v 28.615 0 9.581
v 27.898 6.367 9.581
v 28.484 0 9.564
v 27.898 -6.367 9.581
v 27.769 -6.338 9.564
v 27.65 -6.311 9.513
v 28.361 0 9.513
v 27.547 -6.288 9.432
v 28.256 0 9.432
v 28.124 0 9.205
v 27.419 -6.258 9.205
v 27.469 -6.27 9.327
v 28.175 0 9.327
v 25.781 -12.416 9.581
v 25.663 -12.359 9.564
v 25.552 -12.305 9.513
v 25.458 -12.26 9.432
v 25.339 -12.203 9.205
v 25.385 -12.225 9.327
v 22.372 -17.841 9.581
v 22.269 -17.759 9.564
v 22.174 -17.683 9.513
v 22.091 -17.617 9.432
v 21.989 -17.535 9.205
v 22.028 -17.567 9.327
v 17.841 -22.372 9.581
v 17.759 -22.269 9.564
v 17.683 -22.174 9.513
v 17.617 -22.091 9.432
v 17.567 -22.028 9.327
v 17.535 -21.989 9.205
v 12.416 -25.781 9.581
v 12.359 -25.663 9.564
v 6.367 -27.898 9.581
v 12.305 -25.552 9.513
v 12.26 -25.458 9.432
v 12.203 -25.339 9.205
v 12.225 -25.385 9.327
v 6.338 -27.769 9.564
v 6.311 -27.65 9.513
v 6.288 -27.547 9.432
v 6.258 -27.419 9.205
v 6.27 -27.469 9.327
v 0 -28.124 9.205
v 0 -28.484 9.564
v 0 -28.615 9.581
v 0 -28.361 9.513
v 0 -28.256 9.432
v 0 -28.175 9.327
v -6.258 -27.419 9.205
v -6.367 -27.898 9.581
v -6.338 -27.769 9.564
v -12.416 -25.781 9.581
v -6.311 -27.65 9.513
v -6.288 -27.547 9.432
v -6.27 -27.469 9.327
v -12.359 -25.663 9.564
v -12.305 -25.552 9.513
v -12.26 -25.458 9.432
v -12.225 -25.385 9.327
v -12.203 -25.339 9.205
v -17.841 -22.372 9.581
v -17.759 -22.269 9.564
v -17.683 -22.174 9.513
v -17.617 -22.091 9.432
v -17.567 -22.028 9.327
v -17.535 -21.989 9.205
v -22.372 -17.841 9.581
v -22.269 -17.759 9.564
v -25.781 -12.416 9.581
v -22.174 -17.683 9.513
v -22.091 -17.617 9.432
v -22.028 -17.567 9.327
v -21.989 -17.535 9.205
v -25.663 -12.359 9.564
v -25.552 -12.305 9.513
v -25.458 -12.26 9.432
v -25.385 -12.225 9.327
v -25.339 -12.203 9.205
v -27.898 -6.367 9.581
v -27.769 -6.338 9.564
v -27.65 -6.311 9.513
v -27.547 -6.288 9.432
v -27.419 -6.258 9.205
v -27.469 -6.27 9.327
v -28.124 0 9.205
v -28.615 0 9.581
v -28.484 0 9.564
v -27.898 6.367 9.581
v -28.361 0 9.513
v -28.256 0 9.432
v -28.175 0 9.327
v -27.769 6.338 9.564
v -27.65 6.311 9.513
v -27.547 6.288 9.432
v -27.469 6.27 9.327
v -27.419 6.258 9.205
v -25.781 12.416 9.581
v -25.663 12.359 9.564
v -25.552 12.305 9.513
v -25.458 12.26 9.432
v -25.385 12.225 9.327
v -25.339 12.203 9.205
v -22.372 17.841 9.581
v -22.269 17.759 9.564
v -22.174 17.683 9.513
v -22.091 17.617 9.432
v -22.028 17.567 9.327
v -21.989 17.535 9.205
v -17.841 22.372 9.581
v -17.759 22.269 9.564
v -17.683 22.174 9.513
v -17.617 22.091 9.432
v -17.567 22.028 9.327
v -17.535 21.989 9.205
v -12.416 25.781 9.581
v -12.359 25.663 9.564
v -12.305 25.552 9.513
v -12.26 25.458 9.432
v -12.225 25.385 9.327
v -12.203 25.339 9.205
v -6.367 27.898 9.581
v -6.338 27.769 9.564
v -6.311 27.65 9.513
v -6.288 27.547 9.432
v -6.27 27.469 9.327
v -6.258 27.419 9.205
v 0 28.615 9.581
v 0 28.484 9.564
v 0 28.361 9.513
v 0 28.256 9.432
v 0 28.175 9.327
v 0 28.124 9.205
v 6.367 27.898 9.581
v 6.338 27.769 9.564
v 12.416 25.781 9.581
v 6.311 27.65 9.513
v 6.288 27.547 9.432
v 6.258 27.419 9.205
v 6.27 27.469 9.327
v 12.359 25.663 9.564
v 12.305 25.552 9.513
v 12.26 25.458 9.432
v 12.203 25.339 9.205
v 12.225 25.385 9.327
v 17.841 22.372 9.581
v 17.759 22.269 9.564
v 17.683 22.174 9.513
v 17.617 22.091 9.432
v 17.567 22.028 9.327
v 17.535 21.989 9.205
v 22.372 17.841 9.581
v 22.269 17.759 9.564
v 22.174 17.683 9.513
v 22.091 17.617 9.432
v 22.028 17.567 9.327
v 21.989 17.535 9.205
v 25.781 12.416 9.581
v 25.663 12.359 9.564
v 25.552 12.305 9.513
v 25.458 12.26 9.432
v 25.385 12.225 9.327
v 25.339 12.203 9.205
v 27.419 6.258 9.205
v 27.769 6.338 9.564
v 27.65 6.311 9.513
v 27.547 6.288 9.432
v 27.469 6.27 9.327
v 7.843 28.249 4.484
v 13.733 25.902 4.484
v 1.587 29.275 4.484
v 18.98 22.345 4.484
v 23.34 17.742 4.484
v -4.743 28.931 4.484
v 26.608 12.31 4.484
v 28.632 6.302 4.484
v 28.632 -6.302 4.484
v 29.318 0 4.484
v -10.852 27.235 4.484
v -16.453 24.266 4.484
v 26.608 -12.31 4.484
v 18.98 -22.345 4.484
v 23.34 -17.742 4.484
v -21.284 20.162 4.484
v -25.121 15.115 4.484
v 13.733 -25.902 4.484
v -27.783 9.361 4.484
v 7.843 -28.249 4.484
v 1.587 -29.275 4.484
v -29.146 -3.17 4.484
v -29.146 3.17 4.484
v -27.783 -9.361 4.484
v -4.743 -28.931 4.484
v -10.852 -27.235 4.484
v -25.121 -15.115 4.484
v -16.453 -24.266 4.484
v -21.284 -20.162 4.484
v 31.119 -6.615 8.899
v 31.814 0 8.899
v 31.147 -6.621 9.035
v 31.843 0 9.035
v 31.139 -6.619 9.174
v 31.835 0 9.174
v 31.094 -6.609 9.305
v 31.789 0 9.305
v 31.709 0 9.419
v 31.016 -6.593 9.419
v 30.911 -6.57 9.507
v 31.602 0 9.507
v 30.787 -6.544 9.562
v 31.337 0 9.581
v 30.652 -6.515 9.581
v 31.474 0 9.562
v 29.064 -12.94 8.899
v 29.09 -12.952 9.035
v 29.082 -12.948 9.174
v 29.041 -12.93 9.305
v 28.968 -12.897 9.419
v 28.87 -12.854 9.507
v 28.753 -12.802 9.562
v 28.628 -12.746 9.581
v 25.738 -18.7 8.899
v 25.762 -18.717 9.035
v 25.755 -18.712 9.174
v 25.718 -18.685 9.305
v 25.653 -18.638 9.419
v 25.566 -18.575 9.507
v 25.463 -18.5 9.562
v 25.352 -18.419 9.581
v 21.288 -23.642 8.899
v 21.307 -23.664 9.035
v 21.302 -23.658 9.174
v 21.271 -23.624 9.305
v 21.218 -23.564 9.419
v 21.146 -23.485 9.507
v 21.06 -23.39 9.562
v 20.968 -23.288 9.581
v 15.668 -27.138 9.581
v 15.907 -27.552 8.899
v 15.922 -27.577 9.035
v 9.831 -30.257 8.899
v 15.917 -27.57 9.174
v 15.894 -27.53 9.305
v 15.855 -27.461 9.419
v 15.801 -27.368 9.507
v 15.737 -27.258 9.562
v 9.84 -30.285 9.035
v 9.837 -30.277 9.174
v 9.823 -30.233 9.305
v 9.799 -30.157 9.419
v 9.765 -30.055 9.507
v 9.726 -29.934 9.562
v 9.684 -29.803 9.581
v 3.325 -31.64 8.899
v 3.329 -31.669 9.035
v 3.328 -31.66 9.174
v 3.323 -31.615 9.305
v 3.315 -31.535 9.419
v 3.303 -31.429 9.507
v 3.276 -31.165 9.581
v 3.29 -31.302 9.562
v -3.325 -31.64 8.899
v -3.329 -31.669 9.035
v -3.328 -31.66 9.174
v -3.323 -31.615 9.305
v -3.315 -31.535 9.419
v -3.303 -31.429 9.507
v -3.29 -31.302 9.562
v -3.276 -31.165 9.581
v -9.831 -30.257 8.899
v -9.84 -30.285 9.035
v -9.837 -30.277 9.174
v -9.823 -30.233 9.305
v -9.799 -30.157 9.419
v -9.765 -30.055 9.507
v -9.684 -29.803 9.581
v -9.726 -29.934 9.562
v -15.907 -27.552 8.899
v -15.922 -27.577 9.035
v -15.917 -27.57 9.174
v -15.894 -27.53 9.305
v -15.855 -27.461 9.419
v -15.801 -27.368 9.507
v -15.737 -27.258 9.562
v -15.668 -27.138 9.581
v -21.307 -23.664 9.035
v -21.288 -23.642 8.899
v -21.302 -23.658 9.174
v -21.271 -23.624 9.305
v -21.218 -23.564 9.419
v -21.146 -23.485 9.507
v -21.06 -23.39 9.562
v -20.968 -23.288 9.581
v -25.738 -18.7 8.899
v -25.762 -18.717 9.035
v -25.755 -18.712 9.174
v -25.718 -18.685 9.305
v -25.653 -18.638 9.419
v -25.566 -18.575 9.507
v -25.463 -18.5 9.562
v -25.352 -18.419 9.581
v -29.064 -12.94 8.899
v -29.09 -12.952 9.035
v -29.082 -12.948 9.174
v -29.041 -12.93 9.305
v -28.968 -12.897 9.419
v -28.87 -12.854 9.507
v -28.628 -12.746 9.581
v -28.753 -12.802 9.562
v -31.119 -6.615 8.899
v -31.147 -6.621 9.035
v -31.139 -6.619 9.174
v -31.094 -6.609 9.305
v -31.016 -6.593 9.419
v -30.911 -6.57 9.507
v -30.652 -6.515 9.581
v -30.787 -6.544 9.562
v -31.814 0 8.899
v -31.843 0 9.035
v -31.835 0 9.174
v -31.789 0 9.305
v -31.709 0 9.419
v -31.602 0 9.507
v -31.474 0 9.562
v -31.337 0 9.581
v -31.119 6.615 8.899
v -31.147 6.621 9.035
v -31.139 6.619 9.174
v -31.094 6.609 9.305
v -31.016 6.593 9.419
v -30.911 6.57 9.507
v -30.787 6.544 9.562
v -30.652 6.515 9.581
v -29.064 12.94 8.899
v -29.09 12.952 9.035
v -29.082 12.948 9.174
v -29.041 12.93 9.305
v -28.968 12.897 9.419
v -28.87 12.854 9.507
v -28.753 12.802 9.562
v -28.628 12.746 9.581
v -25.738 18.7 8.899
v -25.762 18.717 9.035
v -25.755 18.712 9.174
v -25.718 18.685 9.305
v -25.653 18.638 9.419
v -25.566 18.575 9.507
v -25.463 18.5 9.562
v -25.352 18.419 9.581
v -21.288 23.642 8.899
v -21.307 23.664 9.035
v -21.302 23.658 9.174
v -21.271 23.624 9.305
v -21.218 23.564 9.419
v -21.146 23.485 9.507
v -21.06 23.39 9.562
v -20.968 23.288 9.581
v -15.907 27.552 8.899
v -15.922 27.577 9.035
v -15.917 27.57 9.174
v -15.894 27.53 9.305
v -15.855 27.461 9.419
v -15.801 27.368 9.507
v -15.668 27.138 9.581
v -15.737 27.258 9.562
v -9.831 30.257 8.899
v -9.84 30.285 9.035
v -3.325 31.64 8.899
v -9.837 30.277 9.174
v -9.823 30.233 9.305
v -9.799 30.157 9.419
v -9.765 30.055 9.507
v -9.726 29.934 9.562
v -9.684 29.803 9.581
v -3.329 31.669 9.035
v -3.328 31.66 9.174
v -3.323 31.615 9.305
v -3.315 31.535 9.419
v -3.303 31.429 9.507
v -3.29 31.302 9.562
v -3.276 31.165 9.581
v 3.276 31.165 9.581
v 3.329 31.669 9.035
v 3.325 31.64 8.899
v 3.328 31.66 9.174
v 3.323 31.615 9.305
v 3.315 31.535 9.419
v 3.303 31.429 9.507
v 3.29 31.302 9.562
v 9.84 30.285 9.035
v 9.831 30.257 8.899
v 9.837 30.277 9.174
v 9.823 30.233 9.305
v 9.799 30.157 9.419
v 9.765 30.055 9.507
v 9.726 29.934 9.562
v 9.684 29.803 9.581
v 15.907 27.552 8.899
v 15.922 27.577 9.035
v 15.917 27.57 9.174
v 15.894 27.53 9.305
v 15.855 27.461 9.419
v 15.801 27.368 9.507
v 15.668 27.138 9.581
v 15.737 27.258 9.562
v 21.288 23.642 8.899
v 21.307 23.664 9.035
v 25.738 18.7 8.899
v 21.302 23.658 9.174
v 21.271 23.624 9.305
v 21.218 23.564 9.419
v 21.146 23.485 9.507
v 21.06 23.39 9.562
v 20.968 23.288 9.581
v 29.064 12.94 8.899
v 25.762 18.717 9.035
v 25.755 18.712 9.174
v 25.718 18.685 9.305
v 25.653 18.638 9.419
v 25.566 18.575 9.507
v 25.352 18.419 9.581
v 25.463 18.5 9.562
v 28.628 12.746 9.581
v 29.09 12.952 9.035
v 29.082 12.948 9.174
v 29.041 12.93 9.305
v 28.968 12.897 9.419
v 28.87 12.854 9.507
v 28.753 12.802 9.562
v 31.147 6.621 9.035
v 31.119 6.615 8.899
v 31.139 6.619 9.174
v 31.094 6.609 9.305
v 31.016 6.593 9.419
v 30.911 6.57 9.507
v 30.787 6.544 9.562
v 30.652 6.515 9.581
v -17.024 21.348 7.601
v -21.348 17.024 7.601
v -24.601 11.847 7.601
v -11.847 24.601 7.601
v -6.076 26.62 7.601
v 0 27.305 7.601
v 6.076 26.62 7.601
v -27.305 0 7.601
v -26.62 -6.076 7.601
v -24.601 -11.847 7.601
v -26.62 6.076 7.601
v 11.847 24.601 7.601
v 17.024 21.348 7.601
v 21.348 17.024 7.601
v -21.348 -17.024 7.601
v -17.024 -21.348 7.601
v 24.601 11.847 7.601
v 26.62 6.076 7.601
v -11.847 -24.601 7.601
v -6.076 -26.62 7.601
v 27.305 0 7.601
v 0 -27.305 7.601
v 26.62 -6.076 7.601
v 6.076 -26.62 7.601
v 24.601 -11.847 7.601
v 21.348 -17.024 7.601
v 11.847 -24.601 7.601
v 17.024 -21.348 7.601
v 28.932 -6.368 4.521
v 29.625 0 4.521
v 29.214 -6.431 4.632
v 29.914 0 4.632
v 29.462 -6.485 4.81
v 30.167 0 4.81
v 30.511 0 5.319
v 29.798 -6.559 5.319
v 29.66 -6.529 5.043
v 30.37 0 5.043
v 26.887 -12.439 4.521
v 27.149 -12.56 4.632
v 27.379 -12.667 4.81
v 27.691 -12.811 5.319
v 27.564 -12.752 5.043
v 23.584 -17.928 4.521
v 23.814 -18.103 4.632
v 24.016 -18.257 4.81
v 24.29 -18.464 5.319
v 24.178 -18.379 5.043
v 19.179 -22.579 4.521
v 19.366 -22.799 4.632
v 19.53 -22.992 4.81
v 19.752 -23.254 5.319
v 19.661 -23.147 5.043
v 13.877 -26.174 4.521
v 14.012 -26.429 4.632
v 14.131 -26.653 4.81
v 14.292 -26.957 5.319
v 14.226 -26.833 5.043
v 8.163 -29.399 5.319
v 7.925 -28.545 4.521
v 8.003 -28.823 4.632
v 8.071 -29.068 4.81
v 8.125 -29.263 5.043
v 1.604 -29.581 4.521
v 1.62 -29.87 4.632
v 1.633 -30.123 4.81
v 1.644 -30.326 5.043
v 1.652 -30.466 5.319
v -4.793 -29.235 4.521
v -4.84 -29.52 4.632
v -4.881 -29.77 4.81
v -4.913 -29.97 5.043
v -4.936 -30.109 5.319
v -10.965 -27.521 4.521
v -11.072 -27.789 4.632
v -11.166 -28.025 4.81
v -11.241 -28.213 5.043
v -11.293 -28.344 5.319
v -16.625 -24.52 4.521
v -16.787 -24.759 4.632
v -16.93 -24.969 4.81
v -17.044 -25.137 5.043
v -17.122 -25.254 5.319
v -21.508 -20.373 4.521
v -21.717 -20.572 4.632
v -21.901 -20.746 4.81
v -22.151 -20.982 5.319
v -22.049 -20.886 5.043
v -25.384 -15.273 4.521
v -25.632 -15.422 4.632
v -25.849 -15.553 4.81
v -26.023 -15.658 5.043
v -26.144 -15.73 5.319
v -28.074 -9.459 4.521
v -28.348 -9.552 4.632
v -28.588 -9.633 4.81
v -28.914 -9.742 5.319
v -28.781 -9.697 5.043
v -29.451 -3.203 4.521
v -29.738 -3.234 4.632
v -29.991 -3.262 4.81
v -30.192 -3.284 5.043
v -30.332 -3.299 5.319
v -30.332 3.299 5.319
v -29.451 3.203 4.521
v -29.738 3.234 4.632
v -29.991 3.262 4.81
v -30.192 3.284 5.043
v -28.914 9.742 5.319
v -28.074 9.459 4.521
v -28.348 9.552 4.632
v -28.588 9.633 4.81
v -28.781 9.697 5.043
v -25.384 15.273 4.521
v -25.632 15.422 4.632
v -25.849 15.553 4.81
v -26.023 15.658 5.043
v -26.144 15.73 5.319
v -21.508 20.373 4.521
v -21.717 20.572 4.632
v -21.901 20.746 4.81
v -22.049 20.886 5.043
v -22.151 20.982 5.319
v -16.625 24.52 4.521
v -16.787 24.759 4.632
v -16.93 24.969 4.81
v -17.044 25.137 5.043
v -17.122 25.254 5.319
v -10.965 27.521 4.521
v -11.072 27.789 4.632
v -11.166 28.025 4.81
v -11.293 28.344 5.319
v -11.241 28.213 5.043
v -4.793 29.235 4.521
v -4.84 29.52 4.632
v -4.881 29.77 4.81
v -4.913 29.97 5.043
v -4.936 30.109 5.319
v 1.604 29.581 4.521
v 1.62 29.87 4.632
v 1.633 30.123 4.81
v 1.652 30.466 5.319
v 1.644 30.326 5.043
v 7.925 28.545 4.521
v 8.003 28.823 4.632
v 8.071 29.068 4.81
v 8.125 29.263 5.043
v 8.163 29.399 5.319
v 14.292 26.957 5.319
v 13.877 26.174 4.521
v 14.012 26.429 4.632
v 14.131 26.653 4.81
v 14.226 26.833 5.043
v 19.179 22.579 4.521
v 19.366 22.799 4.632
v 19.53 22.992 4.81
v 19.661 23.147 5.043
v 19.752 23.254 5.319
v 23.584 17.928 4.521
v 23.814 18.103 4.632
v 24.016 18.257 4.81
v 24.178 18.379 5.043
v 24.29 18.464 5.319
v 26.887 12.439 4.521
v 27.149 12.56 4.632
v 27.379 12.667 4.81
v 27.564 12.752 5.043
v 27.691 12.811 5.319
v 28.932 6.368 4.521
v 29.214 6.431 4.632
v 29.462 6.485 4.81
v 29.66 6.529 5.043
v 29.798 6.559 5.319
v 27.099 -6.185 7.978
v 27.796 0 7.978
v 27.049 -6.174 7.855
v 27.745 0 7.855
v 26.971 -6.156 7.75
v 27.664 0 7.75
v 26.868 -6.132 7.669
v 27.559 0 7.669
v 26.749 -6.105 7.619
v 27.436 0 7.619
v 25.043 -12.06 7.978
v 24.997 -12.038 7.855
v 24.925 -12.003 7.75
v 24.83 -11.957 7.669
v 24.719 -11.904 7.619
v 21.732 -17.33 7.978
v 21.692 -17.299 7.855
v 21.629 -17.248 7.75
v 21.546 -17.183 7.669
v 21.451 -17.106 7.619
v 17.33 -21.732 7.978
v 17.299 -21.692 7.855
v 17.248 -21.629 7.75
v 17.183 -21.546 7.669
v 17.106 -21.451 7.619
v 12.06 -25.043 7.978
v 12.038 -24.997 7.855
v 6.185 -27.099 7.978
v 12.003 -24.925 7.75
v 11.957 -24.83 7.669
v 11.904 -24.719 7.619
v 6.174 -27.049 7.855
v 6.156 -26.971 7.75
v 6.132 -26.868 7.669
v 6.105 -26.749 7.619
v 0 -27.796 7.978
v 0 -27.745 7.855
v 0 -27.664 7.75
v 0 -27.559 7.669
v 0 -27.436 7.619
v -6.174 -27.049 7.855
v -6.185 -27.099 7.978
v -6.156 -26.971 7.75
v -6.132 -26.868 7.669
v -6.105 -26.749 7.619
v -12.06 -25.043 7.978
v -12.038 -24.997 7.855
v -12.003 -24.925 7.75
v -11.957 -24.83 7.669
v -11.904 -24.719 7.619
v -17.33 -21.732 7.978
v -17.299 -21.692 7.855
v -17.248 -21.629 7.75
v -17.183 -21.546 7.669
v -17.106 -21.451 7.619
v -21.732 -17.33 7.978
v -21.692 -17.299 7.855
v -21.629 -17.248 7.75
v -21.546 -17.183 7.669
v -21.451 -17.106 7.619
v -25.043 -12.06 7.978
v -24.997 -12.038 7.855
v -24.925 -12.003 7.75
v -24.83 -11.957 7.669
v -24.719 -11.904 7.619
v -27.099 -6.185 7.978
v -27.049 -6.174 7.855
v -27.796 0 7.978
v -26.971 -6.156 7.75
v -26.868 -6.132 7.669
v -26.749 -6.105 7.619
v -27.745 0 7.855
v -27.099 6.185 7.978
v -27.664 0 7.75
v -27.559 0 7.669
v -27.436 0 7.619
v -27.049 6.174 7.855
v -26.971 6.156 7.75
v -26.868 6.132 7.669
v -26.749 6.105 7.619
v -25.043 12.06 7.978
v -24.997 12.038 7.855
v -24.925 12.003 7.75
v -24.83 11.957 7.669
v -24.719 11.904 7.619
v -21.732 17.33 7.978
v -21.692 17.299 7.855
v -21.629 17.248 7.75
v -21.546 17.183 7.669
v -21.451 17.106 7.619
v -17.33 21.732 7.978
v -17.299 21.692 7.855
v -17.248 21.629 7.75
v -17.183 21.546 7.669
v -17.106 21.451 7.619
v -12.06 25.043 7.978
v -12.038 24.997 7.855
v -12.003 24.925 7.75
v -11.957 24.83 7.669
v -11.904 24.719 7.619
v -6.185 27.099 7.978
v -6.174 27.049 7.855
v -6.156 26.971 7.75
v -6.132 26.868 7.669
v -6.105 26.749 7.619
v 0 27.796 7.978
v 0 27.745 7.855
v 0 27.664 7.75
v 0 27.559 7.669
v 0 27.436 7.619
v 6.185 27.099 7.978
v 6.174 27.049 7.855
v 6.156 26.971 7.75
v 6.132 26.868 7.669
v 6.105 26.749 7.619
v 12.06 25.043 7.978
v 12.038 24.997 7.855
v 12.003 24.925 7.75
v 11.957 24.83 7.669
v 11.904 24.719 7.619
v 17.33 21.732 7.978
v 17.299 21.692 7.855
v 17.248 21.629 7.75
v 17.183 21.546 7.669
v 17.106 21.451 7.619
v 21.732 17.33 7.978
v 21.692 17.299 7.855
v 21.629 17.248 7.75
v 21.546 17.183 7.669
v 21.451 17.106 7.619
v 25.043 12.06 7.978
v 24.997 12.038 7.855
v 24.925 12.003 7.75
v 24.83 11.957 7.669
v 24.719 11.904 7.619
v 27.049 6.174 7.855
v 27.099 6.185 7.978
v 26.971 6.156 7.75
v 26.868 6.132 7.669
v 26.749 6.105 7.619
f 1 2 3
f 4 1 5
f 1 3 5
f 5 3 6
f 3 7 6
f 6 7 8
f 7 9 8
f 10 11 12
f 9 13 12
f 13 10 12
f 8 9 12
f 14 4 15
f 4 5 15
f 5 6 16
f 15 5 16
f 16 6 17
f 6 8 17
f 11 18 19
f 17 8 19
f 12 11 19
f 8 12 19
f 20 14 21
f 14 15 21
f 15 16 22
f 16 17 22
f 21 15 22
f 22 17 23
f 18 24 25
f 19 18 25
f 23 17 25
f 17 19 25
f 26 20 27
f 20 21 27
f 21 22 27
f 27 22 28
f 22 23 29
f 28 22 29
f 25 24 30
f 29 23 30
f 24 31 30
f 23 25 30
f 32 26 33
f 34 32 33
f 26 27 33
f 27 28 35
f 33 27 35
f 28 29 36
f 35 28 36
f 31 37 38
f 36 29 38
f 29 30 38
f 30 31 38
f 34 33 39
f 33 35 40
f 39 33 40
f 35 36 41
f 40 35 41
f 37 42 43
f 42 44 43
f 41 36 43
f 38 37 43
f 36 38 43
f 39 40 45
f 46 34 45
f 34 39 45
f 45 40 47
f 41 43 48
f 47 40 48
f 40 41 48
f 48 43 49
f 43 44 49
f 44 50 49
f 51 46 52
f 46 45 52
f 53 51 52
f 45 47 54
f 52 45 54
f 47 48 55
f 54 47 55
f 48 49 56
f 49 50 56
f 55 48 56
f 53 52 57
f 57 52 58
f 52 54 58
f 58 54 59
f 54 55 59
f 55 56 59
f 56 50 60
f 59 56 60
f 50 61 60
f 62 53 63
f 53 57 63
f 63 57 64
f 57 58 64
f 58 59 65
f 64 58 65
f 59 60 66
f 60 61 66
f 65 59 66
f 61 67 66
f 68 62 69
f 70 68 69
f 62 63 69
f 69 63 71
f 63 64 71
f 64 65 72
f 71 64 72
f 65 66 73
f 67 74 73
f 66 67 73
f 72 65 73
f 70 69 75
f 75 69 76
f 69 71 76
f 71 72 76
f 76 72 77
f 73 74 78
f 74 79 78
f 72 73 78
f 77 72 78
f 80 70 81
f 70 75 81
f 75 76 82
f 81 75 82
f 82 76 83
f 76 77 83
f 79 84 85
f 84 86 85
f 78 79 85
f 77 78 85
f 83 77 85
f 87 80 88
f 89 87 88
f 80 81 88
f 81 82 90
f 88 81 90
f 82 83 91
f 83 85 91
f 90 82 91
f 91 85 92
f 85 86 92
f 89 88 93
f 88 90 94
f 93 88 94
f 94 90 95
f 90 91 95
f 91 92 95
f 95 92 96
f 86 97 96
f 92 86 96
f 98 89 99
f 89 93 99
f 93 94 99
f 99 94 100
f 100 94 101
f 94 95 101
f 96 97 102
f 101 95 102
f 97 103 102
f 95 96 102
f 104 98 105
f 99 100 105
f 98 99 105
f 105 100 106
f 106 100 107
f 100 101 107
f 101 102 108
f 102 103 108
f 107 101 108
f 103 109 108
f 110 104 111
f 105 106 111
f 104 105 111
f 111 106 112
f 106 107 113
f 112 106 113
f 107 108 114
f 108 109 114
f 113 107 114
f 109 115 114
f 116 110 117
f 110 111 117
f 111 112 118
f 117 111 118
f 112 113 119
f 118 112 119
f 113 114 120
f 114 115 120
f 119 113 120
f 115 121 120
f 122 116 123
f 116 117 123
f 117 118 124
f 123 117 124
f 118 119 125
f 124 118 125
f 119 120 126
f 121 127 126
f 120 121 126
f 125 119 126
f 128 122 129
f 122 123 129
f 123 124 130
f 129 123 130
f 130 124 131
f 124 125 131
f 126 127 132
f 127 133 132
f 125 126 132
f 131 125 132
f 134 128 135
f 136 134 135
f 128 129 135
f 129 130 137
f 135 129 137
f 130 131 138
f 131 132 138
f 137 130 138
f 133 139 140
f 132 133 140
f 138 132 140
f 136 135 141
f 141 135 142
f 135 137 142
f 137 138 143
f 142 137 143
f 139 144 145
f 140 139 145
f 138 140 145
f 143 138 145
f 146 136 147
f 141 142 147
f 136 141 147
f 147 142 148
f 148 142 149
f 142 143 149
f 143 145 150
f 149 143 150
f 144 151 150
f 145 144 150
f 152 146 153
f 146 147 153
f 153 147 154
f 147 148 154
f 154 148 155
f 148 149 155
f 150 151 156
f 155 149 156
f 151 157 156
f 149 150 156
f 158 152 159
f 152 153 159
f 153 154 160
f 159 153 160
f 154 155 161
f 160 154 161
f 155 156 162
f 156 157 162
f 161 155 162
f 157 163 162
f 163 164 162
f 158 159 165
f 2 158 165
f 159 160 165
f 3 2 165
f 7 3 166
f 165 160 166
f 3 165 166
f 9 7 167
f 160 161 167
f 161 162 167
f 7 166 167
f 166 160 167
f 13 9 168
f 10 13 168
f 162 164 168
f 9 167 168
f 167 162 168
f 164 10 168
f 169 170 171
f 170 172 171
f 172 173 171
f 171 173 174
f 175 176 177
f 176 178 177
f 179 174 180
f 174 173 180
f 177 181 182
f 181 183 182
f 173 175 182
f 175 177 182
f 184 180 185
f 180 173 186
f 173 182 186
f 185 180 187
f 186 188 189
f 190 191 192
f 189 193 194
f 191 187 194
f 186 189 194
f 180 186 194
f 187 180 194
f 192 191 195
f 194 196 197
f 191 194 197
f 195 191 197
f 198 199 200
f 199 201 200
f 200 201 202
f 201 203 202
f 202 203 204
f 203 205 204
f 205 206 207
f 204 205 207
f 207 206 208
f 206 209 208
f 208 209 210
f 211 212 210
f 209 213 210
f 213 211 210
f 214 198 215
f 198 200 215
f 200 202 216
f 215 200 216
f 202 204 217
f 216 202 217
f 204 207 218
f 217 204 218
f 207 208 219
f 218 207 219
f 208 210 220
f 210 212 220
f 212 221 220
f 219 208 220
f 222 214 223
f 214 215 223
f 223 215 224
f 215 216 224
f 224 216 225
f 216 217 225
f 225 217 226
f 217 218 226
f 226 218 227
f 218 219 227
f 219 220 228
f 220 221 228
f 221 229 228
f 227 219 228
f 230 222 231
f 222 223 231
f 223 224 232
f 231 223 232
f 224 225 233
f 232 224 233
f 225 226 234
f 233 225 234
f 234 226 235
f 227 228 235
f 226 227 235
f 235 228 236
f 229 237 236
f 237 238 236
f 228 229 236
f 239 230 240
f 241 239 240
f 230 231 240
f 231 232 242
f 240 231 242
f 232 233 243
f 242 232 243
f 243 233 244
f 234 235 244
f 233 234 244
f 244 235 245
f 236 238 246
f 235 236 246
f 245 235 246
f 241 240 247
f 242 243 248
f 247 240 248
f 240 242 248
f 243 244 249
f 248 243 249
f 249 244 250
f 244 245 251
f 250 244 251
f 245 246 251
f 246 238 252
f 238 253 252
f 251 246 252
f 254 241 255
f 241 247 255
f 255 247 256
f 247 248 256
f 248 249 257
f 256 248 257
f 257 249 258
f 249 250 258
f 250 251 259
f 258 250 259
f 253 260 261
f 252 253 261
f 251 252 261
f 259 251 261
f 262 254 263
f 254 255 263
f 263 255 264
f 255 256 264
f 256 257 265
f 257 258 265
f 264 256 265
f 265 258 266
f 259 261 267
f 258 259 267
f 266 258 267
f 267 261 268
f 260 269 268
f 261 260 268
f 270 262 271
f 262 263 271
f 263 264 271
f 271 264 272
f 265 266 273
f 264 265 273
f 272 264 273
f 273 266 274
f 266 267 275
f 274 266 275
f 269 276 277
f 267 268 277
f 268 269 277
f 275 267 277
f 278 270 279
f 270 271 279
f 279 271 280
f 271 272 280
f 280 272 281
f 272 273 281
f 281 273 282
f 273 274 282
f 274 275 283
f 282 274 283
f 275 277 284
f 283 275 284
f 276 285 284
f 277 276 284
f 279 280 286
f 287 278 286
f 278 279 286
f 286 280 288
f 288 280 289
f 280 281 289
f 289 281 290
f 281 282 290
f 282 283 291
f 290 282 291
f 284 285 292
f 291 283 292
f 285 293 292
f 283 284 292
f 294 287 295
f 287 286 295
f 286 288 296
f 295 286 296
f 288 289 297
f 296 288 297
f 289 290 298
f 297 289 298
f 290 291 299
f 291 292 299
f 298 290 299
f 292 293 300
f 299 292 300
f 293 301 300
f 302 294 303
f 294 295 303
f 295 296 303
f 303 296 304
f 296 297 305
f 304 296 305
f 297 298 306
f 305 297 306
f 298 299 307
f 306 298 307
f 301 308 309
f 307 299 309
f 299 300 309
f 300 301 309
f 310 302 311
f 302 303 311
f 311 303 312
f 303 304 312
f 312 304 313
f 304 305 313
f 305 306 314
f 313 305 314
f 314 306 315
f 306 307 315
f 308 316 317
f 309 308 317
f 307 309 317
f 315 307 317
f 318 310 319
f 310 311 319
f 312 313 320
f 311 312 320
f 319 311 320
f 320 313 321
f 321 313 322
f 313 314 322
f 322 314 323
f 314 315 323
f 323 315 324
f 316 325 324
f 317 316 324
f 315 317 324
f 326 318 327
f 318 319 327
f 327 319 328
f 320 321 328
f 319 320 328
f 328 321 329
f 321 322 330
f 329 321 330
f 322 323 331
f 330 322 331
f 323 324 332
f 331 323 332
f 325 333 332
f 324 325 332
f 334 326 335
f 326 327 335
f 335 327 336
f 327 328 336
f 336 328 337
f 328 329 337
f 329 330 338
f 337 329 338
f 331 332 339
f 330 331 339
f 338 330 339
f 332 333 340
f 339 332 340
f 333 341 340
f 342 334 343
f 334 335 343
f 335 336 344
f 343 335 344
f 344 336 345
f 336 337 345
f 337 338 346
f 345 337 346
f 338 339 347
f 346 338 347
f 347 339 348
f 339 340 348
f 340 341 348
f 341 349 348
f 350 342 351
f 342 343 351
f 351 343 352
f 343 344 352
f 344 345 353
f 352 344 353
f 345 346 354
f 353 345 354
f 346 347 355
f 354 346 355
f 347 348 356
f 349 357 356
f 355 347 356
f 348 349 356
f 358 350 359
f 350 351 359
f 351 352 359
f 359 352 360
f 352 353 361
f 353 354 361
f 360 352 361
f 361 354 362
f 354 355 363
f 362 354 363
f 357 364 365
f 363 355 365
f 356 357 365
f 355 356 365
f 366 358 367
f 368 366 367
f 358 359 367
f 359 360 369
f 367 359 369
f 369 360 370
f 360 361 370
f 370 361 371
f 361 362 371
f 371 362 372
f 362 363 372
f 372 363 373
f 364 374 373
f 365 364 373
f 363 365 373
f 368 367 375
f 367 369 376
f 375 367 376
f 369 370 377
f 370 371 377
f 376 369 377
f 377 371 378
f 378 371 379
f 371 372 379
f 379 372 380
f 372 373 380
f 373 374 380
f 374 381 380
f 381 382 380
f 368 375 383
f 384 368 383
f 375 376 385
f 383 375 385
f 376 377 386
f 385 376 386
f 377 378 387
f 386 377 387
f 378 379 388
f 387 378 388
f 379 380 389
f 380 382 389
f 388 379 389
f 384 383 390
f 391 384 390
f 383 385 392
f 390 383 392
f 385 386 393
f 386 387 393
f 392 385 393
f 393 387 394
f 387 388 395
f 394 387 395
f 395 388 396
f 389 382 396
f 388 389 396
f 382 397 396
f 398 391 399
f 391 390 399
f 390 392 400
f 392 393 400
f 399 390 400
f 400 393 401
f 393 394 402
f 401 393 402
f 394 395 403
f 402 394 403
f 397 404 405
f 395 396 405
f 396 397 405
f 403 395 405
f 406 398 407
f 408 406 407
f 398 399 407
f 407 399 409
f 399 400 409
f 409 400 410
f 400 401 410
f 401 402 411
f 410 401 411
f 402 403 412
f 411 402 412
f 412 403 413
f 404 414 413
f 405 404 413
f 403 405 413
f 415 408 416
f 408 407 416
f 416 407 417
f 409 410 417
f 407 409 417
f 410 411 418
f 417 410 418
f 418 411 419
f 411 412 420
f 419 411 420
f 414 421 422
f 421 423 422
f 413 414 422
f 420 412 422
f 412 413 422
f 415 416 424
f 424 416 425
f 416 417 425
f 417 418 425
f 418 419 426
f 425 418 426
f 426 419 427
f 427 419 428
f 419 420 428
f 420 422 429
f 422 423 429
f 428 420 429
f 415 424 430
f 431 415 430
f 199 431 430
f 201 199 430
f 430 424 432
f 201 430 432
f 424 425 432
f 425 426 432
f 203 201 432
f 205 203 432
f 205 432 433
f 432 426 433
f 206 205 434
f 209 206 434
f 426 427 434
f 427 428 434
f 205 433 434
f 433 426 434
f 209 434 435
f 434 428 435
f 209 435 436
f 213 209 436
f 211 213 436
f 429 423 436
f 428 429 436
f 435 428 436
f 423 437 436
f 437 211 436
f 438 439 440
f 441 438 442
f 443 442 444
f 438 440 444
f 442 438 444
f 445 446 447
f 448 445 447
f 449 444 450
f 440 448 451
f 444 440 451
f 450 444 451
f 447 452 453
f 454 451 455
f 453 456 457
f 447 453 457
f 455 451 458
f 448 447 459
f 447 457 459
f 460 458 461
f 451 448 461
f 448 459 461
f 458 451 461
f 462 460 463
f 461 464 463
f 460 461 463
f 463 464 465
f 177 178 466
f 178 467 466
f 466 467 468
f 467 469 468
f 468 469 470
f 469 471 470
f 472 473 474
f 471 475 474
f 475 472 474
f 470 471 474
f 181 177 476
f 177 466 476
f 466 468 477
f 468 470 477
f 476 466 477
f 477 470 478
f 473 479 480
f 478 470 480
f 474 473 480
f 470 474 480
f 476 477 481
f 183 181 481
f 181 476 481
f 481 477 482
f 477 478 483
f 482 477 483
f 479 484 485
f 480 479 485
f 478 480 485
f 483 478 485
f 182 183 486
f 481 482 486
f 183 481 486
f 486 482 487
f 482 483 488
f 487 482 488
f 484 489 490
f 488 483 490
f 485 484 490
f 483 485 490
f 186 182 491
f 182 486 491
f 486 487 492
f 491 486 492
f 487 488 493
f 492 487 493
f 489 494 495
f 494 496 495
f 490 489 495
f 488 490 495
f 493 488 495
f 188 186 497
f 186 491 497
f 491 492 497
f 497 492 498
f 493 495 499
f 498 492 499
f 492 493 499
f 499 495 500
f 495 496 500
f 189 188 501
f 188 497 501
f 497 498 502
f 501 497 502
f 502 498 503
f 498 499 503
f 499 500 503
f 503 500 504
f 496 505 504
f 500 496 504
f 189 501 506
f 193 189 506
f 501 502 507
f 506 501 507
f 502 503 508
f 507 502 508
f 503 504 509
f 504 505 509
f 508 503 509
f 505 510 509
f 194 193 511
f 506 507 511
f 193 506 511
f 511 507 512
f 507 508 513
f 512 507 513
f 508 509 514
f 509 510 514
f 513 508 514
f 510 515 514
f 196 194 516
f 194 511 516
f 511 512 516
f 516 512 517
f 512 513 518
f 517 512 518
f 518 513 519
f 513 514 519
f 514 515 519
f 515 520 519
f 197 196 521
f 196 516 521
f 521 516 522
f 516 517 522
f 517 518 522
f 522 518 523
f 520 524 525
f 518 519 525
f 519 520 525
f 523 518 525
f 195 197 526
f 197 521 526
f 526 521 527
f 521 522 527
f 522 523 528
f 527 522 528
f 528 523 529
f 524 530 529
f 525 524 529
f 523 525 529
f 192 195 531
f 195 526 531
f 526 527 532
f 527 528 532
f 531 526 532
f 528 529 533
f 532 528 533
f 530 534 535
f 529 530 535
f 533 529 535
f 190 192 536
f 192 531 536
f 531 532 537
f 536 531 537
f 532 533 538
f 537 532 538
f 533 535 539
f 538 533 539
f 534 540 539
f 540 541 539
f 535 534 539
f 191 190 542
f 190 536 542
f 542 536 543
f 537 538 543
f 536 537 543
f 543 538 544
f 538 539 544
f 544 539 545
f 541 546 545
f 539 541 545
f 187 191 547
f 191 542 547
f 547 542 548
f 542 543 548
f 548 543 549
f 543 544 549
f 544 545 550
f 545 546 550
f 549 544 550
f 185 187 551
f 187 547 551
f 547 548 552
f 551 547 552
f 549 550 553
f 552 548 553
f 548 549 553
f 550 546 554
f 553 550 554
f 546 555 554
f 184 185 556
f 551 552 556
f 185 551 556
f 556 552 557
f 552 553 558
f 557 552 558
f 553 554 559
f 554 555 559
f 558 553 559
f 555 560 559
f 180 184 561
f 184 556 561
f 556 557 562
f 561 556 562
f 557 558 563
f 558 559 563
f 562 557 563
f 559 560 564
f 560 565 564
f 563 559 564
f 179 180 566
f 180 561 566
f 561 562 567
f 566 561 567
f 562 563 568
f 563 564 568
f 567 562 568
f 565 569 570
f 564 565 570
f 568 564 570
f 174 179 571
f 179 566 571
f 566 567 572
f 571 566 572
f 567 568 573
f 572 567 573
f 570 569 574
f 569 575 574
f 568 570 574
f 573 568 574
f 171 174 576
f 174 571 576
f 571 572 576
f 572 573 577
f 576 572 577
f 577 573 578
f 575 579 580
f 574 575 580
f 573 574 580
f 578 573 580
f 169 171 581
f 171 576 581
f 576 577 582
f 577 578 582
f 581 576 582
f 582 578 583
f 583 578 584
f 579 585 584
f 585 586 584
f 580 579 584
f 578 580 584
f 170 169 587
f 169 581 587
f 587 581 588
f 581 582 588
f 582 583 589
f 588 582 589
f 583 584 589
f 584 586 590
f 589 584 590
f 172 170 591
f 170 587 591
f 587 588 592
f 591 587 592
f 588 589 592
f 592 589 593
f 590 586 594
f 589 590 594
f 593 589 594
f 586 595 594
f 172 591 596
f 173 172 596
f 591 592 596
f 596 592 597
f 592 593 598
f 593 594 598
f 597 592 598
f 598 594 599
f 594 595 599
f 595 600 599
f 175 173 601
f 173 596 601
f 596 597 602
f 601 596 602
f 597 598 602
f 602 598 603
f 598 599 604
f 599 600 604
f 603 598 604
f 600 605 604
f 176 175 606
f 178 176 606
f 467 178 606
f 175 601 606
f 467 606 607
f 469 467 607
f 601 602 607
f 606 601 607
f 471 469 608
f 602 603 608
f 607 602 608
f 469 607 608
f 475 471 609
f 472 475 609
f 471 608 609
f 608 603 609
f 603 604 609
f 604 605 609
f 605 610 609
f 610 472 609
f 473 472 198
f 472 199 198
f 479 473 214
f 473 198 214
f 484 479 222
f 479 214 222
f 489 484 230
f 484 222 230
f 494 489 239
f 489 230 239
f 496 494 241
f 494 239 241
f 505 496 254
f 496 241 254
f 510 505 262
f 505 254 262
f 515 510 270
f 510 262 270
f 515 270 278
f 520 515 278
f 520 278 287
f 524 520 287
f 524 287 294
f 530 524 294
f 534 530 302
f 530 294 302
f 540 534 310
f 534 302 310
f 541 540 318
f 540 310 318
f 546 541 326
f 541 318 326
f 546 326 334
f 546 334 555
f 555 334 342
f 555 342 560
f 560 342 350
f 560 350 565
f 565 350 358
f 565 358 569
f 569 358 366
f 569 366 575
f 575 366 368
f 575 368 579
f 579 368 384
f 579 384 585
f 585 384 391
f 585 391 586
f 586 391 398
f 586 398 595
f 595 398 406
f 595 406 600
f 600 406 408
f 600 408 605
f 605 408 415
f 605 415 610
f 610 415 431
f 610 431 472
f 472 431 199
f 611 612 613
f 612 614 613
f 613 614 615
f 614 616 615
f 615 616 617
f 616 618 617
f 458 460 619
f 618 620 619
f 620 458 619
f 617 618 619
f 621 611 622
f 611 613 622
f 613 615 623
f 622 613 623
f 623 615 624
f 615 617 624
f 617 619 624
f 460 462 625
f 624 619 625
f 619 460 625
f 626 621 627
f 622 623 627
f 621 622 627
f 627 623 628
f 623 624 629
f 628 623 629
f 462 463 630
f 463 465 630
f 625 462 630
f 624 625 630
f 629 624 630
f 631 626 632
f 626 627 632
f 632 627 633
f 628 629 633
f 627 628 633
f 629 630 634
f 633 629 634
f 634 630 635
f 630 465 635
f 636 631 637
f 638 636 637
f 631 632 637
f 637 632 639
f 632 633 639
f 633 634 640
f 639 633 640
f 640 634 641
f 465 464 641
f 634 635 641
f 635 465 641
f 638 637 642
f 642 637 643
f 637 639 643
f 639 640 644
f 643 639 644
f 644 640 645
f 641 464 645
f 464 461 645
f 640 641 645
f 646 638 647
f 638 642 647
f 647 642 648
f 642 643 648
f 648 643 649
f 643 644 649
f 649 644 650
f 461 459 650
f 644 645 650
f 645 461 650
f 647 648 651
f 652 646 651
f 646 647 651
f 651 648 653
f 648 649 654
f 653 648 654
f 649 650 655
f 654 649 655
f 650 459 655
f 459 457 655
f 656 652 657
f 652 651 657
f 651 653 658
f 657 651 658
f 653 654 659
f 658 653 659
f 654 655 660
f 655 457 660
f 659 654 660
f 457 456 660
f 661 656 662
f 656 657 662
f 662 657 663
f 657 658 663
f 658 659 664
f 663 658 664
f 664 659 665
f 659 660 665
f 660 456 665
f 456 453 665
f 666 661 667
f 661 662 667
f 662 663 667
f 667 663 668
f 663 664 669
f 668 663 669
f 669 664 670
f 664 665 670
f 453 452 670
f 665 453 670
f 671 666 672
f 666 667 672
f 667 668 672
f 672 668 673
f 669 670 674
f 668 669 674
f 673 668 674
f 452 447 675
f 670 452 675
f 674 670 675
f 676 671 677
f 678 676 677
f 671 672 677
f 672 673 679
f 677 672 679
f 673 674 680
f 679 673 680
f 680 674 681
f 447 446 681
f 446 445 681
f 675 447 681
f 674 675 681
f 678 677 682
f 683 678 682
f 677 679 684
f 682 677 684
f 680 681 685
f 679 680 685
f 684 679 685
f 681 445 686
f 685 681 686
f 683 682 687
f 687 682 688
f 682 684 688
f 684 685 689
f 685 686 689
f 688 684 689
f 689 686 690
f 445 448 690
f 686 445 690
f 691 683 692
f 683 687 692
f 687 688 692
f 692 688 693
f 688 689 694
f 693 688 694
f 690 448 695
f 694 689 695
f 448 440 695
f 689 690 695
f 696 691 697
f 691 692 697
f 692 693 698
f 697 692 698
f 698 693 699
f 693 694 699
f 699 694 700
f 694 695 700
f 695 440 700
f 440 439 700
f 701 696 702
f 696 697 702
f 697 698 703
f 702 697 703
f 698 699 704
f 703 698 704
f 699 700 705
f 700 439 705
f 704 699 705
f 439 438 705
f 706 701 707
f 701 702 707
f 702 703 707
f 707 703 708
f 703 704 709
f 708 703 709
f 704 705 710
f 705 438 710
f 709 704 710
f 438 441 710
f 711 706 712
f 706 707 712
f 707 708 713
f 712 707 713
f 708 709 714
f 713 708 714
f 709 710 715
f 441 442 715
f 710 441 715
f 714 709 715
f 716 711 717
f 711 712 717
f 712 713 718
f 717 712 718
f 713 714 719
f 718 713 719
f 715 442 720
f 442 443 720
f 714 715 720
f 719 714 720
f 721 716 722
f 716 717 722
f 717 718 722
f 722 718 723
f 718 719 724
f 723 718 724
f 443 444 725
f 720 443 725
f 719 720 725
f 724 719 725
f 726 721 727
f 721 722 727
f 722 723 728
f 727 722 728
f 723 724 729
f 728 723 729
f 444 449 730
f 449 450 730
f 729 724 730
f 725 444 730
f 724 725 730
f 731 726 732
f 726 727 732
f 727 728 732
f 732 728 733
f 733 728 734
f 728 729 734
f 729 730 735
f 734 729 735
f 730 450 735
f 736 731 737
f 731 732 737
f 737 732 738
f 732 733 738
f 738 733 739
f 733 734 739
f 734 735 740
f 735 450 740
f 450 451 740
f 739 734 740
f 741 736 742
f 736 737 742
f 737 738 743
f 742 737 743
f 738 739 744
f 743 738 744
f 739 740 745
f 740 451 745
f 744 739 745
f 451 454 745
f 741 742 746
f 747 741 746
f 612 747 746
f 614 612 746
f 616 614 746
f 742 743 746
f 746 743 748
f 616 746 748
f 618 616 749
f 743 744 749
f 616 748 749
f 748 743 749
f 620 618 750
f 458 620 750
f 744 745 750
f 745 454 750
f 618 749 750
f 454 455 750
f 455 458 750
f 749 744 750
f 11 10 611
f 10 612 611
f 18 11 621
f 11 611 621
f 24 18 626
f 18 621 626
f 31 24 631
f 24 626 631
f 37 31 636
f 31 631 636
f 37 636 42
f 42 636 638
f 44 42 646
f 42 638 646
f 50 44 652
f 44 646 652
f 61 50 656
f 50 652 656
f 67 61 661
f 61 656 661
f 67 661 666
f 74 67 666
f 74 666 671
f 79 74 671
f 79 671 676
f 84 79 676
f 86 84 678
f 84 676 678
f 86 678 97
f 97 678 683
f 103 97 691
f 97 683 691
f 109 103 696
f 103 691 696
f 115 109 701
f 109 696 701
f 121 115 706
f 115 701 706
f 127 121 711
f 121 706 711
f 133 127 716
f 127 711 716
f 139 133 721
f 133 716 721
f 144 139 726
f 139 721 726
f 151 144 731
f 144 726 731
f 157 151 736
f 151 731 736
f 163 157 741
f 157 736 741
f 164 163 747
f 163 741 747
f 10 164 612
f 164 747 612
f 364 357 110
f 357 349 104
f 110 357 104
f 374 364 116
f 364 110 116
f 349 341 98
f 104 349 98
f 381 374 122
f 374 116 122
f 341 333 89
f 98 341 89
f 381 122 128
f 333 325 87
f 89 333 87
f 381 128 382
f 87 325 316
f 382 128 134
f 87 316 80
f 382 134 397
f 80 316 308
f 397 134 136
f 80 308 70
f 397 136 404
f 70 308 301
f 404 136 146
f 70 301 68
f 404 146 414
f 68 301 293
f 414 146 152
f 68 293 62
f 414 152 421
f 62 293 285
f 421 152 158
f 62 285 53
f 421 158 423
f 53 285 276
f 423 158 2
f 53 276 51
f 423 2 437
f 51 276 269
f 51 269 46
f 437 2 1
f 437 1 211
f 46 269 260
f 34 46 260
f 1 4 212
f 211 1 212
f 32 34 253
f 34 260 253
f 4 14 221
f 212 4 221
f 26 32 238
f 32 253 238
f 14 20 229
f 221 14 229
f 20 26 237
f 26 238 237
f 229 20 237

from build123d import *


with BuildPart() as f2:
    # F0 (on Front) → F2 (revolve)
    with BuildSketch(Plane.XZ):
        with BuildLine():
            Line((27.305, 7.601389), (0, 7.601389))
            Line((0, 7.601389), (0, 4.483546))
            Line((0, 4.483546), (29.317615, 4.483546))
            ThreePointArc((29.317615, 4.483546), (30.046057, 4.713222), (30.511025, 5.31918))
            Line((30.511025, 5.31918), (31.814121, 8.899409))
            ThreePointArc((31.814121, 8.899409), (31.752887, 9.364532), (31.336757, 9.581155))
            Line((31.336757, 9.581155), (28.615081, 9.581155))
            ThreePointArc((28.615081, 9.581155), (28.30583, 9.476179), (28.124391, 9.204635))
            Line((28.124391, 9.204635), (27.79569, 7.977909))
            ThreePointArc((27.79569, 7.977909), (27.614251, 7.706366), (27.305, 7.601389))
        make_face()
    revolve(axis=Axis((0, 0, 5.026823), (0, 0, -1)))


solid = f2.part
